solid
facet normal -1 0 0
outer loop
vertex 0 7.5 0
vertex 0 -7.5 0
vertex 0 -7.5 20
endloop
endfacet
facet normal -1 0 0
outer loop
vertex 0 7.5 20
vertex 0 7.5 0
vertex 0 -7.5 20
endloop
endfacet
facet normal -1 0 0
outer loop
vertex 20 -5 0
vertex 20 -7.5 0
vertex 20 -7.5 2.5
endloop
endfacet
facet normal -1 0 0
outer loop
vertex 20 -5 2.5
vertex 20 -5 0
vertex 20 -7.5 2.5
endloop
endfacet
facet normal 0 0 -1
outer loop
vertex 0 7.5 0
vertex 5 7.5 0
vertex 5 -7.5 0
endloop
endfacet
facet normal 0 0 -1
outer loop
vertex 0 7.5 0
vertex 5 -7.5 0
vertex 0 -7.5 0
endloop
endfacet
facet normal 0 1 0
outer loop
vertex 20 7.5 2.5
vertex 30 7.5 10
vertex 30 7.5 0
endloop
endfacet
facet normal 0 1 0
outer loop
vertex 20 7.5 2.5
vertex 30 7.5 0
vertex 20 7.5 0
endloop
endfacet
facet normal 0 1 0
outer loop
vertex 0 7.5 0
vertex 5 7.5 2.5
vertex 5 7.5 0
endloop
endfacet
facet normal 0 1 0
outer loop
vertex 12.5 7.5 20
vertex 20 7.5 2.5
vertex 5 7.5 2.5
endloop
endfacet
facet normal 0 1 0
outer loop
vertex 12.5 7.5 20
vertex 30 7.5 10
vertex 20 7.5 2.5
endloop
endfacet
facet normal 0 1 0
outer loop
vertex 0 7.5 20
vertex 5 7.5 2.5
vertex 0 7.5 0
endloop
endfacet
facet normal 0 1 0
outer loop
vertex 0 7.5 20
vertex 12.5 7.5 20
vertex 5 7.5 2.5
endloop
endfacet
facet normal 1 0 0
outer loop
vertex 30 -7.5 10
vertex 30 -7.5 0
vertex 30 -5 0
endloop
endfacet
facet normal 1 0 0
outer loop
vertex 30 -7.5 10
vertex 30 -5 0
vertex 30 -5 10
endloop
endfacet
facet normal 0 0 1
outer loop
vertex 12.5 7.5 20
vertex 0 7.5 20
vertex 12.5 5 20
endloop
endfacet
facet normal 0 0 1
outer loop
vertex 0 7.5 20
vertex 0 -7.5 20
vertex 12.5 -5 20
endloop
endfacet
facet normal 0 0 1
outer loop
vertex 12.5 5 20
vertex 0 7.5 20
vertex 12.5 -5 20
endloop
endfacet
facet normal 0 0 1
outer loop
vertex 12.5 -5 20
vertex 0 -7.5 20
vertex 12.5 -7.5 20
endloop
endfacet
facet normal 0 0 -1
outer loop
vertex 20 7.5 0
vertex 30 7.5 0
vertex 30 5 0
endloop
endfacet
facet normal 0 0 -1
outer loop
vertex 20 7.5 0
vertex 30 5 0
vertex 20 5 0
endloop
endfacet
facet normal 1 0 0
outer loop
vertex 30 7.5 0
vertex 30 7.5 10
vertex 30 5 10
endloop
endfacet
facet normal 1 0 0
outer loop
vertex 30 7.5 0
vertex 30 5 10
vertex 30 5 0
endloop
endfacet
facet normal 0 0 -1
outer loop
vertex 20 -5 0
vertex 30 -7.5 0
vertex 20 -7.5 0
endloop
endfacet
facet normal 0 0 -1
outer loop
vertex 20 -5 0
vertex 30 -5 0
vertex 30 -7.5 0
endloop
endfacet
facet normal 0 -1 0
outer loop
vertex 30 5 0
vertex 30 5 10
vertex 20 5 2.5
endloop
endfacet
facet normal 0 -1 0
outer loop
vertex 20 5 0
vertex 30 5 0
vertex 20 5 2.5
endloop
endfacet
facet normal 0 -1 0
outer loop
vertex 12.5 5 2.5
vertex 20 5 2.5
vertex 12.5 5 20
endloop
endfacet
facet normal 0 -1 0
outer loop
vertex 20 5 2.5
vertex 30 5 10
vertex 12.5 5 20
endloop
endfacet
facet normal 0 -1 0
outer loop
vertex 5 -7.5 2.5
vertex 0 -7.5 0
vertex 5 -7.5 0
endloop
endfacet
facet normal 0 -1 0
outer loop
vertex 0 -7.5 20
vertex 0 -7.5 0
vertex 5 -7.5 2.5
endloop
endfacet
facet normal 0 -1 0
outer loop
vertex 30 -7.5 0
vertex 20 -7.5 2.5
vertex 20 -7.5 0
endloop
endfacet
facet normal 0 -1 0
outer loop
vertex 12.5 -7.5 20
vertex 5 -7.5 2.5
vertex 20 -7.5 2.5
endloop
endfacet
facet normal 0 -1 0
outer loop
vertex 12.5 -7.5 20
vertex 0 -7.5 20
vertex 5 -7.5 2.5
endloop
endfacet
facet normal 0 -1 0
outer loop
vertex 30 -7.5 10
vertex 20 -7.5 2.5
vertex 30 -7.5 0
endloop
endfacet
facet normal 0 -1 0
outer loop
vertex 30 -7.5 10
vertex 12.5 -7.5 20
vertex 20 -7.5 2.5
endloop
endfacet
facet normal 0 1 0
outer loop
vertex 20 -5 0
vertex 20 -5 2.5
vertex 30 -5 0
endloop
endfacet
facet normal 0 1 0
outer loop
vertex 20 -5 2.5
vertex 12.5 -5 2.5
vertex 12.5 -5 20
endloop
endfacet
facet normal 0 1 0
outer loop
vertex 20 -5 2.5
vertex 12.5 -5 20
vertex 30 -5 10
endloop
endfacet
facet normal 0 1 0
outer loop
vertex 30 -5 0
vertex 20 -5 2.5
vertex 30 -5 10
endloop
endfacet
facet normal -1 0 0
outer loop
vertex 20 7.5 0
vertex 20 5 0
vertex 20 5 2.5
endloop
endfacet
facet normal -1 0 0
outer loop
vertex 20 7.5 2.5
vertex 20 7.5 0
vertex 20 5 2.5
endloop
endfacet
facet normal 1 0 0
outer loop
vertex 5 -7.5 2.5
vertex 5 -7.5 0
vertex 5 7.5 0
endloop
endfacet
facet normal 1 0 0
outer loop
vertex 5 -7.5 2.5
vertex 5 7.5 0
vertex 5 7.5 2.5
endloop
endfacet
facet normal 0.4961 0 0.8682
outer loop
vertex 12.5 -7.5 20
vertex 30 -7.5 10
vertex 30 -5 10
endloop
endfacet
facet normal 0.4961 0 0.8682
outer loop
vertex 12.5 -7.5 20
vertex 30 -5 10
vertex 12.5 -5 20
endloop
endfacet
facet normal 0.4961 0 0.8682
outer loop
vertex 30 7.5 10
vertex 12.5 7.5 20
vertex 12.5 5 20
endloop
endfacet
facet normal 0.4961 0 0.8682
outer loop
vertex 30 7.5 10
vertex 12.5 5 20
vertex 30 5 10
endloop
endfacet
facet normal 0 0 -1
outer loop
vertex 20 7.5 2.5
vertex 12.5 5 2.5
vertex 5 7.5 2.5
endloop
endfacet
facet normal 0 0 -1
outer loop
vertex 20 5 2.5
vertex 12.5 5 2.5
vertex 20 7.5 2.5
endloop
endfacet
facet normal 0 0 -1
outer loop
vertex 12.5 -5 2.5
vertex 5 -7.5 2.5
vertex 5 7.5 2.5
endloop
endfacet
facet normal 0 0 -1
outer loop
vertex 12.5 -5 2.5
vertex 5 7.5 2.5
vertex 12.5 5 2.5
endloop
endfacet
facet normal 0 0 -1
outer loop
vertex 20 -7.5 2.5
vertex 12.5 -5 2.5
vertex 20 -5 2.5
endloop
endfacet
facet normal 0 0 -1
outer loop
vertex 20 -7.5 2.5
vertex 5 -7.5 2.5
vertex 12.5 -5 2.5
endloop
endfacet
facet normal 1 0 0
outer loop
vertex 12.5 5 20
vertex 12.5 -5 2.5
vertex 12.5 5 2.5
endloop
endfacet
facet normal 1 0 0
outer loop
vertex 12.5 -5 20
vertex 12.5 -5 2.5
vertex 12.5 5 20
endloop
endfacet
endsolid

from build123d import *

# Parameters (mm, degrees)
F0_W     = 12.5
F0_H     = 20
F1_DEPTH = 7.5
F3_DEPTH = 2.5
F5_DEPTH = 2.5
F6_W     = 15
F6_H     = 2.5
F7_DEPTH = 15


with BuildPart() as f1:
    # F0 (on Front) → F1 (new body, symmetric)
    with BuildSketch(Plane.XZ):
        with Locations((6.25, 10)):
            Rectangle(F0_W, F0_H)
    extrude(amount=F1_DEPTH, both=True)

    # F2 (on face) → F3 (join)
    with BuildSketch(Plane.XZ.offset(7.5)):
        Polygon((12.5, 20), (12.5, 0), (30, 0), (30, 10), align=None)
    extrude(amount=-F3_DEPTH)

    # F4 (on face) → F5 (join)
    with BuildSketch(Plane(origin=(0, 7.5, 0), x_dir=(-1, 0, 0), z_dir=(0, 1, 0))):
        Polygon((-30, 0), (-12.5, 0), (-12.5, 20), (-30, 10), align=None)
    extrude(amount=-F5_DEPTH)

    # F6 (on face) → F7 (cut, through all)
    with BuildSketch(Plane.XZ.offset(7.5)):
        with Locations((12.5, 1.25)):
            Rectangle(F6_W, F6_H)
    extrude(amount=-F7_DEPTH, mode=Mode.SUBTRACT)


solid = f1.part
